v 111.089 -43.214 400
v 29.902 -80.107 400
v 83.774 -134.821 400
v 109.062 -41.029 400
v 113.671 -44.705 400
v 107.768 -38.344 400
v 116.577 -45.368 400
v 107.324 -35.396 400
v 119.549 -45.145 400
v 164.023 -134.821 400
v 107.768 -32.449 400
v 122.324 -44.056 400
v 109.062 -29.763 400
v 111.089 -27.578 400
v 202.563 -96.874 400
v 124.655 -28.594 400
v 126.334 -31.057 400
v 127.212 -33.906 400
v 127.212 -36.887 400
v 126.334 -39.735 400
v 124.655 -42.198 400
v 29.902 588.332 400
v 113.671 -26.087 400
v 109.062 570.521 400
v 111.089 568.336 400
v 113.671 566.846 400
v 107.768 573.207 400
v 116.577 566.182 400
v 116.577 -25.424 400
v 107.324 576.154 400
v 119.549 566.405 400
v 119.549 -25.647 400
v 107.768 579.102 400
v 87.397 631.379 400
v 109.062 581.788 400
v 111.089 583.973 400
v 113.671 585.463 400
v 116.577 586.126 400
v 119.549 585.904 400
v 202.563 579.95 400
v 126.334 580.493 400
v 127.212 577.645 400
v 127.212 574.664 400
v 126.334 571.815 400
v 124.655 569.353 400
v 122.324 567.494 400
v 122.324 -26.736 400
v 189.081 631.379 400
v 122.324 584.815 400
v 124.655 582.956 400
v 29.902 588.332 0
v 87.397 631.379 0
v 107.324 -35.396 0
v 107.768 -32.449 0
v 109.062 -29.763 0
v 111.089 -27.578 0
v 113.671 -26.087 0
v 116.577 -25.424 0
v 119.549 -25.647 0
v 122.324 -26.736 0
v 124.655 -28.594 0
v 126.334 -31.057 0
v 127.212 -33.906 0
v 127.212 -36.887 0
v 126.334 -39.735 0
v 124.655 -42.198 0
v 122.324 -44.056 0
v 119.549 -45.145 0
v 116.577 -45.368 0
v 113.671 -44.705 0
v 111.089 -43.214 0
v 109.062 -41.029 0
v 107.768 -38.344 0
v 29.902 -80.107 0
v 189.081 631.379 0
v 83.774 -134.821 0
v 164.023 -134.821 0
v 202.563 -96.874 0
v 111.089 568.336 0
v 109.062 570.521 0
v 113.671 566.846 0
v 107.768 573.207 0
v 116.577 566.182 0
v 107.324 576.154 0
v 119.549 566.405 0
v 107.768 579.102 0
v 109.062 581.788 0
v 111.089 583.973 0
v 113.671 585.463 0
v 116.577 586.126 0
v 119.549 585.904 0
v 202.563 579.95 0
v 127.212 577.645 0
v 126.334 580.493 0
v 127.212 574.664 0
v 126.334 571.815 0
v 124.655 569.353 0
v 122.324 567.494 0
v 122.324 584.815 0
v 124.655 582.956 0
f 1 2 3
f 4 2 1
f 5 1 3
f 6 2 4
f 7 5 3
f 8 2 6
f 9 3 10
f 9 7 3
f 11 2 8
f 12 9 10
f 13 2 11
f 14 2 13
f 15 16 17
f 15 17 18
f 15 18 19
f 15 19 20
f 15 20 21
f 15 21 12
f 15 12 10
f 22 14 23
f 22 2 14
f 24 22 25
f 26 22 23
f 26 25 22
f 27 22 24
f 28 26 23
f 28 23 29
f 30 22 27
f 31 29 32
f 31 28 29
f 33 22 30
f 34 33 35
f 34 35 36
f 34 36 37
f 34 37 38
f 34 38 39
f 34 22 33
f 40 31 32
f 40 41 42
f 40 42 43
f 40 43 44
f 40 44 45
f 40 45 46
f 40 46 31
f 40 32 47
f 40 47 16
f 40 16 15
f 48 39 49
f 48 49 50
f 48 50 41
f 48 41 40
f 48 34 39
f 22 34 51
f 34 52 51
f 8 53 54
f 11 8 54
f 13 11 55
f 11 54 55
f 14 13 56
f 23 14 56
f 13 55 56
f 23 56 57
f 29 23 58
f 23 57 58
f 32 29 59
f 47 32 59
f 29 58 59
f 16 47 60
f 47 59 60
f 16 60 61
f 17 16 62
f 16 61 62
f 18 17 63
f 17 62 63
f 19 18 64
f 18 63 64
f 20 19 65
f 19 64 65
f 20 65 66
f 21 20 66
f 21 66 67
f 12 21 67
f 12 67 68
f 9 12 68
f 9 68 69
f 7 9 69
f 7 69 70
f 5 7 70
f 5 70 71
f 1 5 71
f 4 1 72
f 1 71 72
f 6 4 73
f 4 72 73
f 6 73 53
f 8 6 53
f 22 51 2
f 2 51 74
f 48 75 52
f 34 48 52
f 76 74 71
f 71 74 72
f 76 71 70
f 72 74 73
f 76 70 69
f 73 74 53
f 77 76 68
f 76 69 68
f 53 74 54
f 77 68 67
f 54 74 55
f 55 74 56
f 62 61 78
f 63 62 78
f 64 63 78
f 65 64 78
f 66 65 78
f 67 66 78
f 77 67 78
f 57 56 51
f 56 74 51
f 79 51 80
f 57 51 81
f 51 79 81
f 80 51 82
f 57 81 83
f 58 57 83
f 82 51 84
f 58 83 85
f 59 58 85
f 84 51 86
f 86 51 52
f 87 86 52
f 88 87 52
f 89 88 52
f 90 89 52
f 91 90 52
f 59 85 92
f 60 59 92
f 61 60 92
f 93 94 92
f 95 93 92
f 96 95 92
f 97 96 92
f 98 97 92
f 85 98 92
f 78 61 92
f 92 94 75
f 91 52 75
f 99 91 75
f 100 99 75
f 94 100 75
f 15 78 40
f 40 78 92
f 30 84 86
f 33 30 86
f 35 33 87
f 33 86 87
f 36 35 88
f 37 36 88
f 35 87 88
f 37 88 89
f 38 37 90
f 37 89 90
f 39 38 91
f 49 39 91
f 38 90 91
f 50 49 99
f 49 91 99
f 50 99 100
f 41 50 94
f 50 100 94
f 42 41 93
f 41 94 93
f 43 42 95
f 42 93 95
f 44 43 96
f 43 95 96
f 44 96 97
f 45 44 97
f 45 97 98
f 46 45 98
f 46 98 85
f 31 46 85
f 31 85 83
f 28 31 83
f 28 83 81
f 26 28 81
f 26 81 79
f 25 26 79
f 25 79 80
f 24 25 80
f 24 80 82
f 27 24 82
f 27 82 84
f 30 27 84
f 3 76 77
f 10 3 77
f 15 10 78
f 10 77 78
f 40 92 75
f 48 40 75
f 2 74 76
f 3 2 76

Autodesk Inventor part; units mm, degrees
ref_plane "YZ Plane" through (0, 0, 0) normal (1, 0, 0) x (0, 1, 0)
ref_plane "XZ Plane" through (0, 0, 0) normal (0, 1, 0) x (-1, 0, 0)
ref_plane "XY Plane" through (0, 0, 0) normal (0, 0, 1) x (1, 0, 0)
sketch "Эскиз1" plane through (0, 0, 0) normal (0, 0, 1) x (1, 0, 0)
  line L0 (29.9018, -80.1068) -> (83.774, -134.8208)
  line L1 (83.774, -134.8208) -> (164.0232, -134.8208)
  line L2 (164.0232, -134.8208) -> (202.5632, -96.8737)
  line L3 (202.5632, -96.8737) -> (202.5632, 92.1914)
  line L4 (202.5632, 92.1914) -> (202.5632, 579.95)
  line L5 (202.5632, 579.95) -> (189.081, 631.379)
  line L6 (189.081, 631.379) -> (87.3973, 631.379)
  line L7 (87.3973, 631.379) -> (29.9018, 588.3315)
  line L8 (29.9018, 588.3315) -> (29.9018, -80.1068)
  point P0 (0, 0)
extrude "Выдавливание1" add sketch "Эскиз1" along normal blind 400
sketch "Эскиз2" plane through (0, 0, 0) normal (0, 0, -1) x (-1, 0, 0)
  circle A0 centre (-117.324, -35.3961) radius 10
  circle A1 centre (-117.324, 576.1543) radius 10
  point P0 (0, 0)
  dimension "d2" = 20
  dimension "d3" = 20
extrude "Выдавливание2" cut sketch "Эскиз2" against normal through all
properties part number "Тело"
